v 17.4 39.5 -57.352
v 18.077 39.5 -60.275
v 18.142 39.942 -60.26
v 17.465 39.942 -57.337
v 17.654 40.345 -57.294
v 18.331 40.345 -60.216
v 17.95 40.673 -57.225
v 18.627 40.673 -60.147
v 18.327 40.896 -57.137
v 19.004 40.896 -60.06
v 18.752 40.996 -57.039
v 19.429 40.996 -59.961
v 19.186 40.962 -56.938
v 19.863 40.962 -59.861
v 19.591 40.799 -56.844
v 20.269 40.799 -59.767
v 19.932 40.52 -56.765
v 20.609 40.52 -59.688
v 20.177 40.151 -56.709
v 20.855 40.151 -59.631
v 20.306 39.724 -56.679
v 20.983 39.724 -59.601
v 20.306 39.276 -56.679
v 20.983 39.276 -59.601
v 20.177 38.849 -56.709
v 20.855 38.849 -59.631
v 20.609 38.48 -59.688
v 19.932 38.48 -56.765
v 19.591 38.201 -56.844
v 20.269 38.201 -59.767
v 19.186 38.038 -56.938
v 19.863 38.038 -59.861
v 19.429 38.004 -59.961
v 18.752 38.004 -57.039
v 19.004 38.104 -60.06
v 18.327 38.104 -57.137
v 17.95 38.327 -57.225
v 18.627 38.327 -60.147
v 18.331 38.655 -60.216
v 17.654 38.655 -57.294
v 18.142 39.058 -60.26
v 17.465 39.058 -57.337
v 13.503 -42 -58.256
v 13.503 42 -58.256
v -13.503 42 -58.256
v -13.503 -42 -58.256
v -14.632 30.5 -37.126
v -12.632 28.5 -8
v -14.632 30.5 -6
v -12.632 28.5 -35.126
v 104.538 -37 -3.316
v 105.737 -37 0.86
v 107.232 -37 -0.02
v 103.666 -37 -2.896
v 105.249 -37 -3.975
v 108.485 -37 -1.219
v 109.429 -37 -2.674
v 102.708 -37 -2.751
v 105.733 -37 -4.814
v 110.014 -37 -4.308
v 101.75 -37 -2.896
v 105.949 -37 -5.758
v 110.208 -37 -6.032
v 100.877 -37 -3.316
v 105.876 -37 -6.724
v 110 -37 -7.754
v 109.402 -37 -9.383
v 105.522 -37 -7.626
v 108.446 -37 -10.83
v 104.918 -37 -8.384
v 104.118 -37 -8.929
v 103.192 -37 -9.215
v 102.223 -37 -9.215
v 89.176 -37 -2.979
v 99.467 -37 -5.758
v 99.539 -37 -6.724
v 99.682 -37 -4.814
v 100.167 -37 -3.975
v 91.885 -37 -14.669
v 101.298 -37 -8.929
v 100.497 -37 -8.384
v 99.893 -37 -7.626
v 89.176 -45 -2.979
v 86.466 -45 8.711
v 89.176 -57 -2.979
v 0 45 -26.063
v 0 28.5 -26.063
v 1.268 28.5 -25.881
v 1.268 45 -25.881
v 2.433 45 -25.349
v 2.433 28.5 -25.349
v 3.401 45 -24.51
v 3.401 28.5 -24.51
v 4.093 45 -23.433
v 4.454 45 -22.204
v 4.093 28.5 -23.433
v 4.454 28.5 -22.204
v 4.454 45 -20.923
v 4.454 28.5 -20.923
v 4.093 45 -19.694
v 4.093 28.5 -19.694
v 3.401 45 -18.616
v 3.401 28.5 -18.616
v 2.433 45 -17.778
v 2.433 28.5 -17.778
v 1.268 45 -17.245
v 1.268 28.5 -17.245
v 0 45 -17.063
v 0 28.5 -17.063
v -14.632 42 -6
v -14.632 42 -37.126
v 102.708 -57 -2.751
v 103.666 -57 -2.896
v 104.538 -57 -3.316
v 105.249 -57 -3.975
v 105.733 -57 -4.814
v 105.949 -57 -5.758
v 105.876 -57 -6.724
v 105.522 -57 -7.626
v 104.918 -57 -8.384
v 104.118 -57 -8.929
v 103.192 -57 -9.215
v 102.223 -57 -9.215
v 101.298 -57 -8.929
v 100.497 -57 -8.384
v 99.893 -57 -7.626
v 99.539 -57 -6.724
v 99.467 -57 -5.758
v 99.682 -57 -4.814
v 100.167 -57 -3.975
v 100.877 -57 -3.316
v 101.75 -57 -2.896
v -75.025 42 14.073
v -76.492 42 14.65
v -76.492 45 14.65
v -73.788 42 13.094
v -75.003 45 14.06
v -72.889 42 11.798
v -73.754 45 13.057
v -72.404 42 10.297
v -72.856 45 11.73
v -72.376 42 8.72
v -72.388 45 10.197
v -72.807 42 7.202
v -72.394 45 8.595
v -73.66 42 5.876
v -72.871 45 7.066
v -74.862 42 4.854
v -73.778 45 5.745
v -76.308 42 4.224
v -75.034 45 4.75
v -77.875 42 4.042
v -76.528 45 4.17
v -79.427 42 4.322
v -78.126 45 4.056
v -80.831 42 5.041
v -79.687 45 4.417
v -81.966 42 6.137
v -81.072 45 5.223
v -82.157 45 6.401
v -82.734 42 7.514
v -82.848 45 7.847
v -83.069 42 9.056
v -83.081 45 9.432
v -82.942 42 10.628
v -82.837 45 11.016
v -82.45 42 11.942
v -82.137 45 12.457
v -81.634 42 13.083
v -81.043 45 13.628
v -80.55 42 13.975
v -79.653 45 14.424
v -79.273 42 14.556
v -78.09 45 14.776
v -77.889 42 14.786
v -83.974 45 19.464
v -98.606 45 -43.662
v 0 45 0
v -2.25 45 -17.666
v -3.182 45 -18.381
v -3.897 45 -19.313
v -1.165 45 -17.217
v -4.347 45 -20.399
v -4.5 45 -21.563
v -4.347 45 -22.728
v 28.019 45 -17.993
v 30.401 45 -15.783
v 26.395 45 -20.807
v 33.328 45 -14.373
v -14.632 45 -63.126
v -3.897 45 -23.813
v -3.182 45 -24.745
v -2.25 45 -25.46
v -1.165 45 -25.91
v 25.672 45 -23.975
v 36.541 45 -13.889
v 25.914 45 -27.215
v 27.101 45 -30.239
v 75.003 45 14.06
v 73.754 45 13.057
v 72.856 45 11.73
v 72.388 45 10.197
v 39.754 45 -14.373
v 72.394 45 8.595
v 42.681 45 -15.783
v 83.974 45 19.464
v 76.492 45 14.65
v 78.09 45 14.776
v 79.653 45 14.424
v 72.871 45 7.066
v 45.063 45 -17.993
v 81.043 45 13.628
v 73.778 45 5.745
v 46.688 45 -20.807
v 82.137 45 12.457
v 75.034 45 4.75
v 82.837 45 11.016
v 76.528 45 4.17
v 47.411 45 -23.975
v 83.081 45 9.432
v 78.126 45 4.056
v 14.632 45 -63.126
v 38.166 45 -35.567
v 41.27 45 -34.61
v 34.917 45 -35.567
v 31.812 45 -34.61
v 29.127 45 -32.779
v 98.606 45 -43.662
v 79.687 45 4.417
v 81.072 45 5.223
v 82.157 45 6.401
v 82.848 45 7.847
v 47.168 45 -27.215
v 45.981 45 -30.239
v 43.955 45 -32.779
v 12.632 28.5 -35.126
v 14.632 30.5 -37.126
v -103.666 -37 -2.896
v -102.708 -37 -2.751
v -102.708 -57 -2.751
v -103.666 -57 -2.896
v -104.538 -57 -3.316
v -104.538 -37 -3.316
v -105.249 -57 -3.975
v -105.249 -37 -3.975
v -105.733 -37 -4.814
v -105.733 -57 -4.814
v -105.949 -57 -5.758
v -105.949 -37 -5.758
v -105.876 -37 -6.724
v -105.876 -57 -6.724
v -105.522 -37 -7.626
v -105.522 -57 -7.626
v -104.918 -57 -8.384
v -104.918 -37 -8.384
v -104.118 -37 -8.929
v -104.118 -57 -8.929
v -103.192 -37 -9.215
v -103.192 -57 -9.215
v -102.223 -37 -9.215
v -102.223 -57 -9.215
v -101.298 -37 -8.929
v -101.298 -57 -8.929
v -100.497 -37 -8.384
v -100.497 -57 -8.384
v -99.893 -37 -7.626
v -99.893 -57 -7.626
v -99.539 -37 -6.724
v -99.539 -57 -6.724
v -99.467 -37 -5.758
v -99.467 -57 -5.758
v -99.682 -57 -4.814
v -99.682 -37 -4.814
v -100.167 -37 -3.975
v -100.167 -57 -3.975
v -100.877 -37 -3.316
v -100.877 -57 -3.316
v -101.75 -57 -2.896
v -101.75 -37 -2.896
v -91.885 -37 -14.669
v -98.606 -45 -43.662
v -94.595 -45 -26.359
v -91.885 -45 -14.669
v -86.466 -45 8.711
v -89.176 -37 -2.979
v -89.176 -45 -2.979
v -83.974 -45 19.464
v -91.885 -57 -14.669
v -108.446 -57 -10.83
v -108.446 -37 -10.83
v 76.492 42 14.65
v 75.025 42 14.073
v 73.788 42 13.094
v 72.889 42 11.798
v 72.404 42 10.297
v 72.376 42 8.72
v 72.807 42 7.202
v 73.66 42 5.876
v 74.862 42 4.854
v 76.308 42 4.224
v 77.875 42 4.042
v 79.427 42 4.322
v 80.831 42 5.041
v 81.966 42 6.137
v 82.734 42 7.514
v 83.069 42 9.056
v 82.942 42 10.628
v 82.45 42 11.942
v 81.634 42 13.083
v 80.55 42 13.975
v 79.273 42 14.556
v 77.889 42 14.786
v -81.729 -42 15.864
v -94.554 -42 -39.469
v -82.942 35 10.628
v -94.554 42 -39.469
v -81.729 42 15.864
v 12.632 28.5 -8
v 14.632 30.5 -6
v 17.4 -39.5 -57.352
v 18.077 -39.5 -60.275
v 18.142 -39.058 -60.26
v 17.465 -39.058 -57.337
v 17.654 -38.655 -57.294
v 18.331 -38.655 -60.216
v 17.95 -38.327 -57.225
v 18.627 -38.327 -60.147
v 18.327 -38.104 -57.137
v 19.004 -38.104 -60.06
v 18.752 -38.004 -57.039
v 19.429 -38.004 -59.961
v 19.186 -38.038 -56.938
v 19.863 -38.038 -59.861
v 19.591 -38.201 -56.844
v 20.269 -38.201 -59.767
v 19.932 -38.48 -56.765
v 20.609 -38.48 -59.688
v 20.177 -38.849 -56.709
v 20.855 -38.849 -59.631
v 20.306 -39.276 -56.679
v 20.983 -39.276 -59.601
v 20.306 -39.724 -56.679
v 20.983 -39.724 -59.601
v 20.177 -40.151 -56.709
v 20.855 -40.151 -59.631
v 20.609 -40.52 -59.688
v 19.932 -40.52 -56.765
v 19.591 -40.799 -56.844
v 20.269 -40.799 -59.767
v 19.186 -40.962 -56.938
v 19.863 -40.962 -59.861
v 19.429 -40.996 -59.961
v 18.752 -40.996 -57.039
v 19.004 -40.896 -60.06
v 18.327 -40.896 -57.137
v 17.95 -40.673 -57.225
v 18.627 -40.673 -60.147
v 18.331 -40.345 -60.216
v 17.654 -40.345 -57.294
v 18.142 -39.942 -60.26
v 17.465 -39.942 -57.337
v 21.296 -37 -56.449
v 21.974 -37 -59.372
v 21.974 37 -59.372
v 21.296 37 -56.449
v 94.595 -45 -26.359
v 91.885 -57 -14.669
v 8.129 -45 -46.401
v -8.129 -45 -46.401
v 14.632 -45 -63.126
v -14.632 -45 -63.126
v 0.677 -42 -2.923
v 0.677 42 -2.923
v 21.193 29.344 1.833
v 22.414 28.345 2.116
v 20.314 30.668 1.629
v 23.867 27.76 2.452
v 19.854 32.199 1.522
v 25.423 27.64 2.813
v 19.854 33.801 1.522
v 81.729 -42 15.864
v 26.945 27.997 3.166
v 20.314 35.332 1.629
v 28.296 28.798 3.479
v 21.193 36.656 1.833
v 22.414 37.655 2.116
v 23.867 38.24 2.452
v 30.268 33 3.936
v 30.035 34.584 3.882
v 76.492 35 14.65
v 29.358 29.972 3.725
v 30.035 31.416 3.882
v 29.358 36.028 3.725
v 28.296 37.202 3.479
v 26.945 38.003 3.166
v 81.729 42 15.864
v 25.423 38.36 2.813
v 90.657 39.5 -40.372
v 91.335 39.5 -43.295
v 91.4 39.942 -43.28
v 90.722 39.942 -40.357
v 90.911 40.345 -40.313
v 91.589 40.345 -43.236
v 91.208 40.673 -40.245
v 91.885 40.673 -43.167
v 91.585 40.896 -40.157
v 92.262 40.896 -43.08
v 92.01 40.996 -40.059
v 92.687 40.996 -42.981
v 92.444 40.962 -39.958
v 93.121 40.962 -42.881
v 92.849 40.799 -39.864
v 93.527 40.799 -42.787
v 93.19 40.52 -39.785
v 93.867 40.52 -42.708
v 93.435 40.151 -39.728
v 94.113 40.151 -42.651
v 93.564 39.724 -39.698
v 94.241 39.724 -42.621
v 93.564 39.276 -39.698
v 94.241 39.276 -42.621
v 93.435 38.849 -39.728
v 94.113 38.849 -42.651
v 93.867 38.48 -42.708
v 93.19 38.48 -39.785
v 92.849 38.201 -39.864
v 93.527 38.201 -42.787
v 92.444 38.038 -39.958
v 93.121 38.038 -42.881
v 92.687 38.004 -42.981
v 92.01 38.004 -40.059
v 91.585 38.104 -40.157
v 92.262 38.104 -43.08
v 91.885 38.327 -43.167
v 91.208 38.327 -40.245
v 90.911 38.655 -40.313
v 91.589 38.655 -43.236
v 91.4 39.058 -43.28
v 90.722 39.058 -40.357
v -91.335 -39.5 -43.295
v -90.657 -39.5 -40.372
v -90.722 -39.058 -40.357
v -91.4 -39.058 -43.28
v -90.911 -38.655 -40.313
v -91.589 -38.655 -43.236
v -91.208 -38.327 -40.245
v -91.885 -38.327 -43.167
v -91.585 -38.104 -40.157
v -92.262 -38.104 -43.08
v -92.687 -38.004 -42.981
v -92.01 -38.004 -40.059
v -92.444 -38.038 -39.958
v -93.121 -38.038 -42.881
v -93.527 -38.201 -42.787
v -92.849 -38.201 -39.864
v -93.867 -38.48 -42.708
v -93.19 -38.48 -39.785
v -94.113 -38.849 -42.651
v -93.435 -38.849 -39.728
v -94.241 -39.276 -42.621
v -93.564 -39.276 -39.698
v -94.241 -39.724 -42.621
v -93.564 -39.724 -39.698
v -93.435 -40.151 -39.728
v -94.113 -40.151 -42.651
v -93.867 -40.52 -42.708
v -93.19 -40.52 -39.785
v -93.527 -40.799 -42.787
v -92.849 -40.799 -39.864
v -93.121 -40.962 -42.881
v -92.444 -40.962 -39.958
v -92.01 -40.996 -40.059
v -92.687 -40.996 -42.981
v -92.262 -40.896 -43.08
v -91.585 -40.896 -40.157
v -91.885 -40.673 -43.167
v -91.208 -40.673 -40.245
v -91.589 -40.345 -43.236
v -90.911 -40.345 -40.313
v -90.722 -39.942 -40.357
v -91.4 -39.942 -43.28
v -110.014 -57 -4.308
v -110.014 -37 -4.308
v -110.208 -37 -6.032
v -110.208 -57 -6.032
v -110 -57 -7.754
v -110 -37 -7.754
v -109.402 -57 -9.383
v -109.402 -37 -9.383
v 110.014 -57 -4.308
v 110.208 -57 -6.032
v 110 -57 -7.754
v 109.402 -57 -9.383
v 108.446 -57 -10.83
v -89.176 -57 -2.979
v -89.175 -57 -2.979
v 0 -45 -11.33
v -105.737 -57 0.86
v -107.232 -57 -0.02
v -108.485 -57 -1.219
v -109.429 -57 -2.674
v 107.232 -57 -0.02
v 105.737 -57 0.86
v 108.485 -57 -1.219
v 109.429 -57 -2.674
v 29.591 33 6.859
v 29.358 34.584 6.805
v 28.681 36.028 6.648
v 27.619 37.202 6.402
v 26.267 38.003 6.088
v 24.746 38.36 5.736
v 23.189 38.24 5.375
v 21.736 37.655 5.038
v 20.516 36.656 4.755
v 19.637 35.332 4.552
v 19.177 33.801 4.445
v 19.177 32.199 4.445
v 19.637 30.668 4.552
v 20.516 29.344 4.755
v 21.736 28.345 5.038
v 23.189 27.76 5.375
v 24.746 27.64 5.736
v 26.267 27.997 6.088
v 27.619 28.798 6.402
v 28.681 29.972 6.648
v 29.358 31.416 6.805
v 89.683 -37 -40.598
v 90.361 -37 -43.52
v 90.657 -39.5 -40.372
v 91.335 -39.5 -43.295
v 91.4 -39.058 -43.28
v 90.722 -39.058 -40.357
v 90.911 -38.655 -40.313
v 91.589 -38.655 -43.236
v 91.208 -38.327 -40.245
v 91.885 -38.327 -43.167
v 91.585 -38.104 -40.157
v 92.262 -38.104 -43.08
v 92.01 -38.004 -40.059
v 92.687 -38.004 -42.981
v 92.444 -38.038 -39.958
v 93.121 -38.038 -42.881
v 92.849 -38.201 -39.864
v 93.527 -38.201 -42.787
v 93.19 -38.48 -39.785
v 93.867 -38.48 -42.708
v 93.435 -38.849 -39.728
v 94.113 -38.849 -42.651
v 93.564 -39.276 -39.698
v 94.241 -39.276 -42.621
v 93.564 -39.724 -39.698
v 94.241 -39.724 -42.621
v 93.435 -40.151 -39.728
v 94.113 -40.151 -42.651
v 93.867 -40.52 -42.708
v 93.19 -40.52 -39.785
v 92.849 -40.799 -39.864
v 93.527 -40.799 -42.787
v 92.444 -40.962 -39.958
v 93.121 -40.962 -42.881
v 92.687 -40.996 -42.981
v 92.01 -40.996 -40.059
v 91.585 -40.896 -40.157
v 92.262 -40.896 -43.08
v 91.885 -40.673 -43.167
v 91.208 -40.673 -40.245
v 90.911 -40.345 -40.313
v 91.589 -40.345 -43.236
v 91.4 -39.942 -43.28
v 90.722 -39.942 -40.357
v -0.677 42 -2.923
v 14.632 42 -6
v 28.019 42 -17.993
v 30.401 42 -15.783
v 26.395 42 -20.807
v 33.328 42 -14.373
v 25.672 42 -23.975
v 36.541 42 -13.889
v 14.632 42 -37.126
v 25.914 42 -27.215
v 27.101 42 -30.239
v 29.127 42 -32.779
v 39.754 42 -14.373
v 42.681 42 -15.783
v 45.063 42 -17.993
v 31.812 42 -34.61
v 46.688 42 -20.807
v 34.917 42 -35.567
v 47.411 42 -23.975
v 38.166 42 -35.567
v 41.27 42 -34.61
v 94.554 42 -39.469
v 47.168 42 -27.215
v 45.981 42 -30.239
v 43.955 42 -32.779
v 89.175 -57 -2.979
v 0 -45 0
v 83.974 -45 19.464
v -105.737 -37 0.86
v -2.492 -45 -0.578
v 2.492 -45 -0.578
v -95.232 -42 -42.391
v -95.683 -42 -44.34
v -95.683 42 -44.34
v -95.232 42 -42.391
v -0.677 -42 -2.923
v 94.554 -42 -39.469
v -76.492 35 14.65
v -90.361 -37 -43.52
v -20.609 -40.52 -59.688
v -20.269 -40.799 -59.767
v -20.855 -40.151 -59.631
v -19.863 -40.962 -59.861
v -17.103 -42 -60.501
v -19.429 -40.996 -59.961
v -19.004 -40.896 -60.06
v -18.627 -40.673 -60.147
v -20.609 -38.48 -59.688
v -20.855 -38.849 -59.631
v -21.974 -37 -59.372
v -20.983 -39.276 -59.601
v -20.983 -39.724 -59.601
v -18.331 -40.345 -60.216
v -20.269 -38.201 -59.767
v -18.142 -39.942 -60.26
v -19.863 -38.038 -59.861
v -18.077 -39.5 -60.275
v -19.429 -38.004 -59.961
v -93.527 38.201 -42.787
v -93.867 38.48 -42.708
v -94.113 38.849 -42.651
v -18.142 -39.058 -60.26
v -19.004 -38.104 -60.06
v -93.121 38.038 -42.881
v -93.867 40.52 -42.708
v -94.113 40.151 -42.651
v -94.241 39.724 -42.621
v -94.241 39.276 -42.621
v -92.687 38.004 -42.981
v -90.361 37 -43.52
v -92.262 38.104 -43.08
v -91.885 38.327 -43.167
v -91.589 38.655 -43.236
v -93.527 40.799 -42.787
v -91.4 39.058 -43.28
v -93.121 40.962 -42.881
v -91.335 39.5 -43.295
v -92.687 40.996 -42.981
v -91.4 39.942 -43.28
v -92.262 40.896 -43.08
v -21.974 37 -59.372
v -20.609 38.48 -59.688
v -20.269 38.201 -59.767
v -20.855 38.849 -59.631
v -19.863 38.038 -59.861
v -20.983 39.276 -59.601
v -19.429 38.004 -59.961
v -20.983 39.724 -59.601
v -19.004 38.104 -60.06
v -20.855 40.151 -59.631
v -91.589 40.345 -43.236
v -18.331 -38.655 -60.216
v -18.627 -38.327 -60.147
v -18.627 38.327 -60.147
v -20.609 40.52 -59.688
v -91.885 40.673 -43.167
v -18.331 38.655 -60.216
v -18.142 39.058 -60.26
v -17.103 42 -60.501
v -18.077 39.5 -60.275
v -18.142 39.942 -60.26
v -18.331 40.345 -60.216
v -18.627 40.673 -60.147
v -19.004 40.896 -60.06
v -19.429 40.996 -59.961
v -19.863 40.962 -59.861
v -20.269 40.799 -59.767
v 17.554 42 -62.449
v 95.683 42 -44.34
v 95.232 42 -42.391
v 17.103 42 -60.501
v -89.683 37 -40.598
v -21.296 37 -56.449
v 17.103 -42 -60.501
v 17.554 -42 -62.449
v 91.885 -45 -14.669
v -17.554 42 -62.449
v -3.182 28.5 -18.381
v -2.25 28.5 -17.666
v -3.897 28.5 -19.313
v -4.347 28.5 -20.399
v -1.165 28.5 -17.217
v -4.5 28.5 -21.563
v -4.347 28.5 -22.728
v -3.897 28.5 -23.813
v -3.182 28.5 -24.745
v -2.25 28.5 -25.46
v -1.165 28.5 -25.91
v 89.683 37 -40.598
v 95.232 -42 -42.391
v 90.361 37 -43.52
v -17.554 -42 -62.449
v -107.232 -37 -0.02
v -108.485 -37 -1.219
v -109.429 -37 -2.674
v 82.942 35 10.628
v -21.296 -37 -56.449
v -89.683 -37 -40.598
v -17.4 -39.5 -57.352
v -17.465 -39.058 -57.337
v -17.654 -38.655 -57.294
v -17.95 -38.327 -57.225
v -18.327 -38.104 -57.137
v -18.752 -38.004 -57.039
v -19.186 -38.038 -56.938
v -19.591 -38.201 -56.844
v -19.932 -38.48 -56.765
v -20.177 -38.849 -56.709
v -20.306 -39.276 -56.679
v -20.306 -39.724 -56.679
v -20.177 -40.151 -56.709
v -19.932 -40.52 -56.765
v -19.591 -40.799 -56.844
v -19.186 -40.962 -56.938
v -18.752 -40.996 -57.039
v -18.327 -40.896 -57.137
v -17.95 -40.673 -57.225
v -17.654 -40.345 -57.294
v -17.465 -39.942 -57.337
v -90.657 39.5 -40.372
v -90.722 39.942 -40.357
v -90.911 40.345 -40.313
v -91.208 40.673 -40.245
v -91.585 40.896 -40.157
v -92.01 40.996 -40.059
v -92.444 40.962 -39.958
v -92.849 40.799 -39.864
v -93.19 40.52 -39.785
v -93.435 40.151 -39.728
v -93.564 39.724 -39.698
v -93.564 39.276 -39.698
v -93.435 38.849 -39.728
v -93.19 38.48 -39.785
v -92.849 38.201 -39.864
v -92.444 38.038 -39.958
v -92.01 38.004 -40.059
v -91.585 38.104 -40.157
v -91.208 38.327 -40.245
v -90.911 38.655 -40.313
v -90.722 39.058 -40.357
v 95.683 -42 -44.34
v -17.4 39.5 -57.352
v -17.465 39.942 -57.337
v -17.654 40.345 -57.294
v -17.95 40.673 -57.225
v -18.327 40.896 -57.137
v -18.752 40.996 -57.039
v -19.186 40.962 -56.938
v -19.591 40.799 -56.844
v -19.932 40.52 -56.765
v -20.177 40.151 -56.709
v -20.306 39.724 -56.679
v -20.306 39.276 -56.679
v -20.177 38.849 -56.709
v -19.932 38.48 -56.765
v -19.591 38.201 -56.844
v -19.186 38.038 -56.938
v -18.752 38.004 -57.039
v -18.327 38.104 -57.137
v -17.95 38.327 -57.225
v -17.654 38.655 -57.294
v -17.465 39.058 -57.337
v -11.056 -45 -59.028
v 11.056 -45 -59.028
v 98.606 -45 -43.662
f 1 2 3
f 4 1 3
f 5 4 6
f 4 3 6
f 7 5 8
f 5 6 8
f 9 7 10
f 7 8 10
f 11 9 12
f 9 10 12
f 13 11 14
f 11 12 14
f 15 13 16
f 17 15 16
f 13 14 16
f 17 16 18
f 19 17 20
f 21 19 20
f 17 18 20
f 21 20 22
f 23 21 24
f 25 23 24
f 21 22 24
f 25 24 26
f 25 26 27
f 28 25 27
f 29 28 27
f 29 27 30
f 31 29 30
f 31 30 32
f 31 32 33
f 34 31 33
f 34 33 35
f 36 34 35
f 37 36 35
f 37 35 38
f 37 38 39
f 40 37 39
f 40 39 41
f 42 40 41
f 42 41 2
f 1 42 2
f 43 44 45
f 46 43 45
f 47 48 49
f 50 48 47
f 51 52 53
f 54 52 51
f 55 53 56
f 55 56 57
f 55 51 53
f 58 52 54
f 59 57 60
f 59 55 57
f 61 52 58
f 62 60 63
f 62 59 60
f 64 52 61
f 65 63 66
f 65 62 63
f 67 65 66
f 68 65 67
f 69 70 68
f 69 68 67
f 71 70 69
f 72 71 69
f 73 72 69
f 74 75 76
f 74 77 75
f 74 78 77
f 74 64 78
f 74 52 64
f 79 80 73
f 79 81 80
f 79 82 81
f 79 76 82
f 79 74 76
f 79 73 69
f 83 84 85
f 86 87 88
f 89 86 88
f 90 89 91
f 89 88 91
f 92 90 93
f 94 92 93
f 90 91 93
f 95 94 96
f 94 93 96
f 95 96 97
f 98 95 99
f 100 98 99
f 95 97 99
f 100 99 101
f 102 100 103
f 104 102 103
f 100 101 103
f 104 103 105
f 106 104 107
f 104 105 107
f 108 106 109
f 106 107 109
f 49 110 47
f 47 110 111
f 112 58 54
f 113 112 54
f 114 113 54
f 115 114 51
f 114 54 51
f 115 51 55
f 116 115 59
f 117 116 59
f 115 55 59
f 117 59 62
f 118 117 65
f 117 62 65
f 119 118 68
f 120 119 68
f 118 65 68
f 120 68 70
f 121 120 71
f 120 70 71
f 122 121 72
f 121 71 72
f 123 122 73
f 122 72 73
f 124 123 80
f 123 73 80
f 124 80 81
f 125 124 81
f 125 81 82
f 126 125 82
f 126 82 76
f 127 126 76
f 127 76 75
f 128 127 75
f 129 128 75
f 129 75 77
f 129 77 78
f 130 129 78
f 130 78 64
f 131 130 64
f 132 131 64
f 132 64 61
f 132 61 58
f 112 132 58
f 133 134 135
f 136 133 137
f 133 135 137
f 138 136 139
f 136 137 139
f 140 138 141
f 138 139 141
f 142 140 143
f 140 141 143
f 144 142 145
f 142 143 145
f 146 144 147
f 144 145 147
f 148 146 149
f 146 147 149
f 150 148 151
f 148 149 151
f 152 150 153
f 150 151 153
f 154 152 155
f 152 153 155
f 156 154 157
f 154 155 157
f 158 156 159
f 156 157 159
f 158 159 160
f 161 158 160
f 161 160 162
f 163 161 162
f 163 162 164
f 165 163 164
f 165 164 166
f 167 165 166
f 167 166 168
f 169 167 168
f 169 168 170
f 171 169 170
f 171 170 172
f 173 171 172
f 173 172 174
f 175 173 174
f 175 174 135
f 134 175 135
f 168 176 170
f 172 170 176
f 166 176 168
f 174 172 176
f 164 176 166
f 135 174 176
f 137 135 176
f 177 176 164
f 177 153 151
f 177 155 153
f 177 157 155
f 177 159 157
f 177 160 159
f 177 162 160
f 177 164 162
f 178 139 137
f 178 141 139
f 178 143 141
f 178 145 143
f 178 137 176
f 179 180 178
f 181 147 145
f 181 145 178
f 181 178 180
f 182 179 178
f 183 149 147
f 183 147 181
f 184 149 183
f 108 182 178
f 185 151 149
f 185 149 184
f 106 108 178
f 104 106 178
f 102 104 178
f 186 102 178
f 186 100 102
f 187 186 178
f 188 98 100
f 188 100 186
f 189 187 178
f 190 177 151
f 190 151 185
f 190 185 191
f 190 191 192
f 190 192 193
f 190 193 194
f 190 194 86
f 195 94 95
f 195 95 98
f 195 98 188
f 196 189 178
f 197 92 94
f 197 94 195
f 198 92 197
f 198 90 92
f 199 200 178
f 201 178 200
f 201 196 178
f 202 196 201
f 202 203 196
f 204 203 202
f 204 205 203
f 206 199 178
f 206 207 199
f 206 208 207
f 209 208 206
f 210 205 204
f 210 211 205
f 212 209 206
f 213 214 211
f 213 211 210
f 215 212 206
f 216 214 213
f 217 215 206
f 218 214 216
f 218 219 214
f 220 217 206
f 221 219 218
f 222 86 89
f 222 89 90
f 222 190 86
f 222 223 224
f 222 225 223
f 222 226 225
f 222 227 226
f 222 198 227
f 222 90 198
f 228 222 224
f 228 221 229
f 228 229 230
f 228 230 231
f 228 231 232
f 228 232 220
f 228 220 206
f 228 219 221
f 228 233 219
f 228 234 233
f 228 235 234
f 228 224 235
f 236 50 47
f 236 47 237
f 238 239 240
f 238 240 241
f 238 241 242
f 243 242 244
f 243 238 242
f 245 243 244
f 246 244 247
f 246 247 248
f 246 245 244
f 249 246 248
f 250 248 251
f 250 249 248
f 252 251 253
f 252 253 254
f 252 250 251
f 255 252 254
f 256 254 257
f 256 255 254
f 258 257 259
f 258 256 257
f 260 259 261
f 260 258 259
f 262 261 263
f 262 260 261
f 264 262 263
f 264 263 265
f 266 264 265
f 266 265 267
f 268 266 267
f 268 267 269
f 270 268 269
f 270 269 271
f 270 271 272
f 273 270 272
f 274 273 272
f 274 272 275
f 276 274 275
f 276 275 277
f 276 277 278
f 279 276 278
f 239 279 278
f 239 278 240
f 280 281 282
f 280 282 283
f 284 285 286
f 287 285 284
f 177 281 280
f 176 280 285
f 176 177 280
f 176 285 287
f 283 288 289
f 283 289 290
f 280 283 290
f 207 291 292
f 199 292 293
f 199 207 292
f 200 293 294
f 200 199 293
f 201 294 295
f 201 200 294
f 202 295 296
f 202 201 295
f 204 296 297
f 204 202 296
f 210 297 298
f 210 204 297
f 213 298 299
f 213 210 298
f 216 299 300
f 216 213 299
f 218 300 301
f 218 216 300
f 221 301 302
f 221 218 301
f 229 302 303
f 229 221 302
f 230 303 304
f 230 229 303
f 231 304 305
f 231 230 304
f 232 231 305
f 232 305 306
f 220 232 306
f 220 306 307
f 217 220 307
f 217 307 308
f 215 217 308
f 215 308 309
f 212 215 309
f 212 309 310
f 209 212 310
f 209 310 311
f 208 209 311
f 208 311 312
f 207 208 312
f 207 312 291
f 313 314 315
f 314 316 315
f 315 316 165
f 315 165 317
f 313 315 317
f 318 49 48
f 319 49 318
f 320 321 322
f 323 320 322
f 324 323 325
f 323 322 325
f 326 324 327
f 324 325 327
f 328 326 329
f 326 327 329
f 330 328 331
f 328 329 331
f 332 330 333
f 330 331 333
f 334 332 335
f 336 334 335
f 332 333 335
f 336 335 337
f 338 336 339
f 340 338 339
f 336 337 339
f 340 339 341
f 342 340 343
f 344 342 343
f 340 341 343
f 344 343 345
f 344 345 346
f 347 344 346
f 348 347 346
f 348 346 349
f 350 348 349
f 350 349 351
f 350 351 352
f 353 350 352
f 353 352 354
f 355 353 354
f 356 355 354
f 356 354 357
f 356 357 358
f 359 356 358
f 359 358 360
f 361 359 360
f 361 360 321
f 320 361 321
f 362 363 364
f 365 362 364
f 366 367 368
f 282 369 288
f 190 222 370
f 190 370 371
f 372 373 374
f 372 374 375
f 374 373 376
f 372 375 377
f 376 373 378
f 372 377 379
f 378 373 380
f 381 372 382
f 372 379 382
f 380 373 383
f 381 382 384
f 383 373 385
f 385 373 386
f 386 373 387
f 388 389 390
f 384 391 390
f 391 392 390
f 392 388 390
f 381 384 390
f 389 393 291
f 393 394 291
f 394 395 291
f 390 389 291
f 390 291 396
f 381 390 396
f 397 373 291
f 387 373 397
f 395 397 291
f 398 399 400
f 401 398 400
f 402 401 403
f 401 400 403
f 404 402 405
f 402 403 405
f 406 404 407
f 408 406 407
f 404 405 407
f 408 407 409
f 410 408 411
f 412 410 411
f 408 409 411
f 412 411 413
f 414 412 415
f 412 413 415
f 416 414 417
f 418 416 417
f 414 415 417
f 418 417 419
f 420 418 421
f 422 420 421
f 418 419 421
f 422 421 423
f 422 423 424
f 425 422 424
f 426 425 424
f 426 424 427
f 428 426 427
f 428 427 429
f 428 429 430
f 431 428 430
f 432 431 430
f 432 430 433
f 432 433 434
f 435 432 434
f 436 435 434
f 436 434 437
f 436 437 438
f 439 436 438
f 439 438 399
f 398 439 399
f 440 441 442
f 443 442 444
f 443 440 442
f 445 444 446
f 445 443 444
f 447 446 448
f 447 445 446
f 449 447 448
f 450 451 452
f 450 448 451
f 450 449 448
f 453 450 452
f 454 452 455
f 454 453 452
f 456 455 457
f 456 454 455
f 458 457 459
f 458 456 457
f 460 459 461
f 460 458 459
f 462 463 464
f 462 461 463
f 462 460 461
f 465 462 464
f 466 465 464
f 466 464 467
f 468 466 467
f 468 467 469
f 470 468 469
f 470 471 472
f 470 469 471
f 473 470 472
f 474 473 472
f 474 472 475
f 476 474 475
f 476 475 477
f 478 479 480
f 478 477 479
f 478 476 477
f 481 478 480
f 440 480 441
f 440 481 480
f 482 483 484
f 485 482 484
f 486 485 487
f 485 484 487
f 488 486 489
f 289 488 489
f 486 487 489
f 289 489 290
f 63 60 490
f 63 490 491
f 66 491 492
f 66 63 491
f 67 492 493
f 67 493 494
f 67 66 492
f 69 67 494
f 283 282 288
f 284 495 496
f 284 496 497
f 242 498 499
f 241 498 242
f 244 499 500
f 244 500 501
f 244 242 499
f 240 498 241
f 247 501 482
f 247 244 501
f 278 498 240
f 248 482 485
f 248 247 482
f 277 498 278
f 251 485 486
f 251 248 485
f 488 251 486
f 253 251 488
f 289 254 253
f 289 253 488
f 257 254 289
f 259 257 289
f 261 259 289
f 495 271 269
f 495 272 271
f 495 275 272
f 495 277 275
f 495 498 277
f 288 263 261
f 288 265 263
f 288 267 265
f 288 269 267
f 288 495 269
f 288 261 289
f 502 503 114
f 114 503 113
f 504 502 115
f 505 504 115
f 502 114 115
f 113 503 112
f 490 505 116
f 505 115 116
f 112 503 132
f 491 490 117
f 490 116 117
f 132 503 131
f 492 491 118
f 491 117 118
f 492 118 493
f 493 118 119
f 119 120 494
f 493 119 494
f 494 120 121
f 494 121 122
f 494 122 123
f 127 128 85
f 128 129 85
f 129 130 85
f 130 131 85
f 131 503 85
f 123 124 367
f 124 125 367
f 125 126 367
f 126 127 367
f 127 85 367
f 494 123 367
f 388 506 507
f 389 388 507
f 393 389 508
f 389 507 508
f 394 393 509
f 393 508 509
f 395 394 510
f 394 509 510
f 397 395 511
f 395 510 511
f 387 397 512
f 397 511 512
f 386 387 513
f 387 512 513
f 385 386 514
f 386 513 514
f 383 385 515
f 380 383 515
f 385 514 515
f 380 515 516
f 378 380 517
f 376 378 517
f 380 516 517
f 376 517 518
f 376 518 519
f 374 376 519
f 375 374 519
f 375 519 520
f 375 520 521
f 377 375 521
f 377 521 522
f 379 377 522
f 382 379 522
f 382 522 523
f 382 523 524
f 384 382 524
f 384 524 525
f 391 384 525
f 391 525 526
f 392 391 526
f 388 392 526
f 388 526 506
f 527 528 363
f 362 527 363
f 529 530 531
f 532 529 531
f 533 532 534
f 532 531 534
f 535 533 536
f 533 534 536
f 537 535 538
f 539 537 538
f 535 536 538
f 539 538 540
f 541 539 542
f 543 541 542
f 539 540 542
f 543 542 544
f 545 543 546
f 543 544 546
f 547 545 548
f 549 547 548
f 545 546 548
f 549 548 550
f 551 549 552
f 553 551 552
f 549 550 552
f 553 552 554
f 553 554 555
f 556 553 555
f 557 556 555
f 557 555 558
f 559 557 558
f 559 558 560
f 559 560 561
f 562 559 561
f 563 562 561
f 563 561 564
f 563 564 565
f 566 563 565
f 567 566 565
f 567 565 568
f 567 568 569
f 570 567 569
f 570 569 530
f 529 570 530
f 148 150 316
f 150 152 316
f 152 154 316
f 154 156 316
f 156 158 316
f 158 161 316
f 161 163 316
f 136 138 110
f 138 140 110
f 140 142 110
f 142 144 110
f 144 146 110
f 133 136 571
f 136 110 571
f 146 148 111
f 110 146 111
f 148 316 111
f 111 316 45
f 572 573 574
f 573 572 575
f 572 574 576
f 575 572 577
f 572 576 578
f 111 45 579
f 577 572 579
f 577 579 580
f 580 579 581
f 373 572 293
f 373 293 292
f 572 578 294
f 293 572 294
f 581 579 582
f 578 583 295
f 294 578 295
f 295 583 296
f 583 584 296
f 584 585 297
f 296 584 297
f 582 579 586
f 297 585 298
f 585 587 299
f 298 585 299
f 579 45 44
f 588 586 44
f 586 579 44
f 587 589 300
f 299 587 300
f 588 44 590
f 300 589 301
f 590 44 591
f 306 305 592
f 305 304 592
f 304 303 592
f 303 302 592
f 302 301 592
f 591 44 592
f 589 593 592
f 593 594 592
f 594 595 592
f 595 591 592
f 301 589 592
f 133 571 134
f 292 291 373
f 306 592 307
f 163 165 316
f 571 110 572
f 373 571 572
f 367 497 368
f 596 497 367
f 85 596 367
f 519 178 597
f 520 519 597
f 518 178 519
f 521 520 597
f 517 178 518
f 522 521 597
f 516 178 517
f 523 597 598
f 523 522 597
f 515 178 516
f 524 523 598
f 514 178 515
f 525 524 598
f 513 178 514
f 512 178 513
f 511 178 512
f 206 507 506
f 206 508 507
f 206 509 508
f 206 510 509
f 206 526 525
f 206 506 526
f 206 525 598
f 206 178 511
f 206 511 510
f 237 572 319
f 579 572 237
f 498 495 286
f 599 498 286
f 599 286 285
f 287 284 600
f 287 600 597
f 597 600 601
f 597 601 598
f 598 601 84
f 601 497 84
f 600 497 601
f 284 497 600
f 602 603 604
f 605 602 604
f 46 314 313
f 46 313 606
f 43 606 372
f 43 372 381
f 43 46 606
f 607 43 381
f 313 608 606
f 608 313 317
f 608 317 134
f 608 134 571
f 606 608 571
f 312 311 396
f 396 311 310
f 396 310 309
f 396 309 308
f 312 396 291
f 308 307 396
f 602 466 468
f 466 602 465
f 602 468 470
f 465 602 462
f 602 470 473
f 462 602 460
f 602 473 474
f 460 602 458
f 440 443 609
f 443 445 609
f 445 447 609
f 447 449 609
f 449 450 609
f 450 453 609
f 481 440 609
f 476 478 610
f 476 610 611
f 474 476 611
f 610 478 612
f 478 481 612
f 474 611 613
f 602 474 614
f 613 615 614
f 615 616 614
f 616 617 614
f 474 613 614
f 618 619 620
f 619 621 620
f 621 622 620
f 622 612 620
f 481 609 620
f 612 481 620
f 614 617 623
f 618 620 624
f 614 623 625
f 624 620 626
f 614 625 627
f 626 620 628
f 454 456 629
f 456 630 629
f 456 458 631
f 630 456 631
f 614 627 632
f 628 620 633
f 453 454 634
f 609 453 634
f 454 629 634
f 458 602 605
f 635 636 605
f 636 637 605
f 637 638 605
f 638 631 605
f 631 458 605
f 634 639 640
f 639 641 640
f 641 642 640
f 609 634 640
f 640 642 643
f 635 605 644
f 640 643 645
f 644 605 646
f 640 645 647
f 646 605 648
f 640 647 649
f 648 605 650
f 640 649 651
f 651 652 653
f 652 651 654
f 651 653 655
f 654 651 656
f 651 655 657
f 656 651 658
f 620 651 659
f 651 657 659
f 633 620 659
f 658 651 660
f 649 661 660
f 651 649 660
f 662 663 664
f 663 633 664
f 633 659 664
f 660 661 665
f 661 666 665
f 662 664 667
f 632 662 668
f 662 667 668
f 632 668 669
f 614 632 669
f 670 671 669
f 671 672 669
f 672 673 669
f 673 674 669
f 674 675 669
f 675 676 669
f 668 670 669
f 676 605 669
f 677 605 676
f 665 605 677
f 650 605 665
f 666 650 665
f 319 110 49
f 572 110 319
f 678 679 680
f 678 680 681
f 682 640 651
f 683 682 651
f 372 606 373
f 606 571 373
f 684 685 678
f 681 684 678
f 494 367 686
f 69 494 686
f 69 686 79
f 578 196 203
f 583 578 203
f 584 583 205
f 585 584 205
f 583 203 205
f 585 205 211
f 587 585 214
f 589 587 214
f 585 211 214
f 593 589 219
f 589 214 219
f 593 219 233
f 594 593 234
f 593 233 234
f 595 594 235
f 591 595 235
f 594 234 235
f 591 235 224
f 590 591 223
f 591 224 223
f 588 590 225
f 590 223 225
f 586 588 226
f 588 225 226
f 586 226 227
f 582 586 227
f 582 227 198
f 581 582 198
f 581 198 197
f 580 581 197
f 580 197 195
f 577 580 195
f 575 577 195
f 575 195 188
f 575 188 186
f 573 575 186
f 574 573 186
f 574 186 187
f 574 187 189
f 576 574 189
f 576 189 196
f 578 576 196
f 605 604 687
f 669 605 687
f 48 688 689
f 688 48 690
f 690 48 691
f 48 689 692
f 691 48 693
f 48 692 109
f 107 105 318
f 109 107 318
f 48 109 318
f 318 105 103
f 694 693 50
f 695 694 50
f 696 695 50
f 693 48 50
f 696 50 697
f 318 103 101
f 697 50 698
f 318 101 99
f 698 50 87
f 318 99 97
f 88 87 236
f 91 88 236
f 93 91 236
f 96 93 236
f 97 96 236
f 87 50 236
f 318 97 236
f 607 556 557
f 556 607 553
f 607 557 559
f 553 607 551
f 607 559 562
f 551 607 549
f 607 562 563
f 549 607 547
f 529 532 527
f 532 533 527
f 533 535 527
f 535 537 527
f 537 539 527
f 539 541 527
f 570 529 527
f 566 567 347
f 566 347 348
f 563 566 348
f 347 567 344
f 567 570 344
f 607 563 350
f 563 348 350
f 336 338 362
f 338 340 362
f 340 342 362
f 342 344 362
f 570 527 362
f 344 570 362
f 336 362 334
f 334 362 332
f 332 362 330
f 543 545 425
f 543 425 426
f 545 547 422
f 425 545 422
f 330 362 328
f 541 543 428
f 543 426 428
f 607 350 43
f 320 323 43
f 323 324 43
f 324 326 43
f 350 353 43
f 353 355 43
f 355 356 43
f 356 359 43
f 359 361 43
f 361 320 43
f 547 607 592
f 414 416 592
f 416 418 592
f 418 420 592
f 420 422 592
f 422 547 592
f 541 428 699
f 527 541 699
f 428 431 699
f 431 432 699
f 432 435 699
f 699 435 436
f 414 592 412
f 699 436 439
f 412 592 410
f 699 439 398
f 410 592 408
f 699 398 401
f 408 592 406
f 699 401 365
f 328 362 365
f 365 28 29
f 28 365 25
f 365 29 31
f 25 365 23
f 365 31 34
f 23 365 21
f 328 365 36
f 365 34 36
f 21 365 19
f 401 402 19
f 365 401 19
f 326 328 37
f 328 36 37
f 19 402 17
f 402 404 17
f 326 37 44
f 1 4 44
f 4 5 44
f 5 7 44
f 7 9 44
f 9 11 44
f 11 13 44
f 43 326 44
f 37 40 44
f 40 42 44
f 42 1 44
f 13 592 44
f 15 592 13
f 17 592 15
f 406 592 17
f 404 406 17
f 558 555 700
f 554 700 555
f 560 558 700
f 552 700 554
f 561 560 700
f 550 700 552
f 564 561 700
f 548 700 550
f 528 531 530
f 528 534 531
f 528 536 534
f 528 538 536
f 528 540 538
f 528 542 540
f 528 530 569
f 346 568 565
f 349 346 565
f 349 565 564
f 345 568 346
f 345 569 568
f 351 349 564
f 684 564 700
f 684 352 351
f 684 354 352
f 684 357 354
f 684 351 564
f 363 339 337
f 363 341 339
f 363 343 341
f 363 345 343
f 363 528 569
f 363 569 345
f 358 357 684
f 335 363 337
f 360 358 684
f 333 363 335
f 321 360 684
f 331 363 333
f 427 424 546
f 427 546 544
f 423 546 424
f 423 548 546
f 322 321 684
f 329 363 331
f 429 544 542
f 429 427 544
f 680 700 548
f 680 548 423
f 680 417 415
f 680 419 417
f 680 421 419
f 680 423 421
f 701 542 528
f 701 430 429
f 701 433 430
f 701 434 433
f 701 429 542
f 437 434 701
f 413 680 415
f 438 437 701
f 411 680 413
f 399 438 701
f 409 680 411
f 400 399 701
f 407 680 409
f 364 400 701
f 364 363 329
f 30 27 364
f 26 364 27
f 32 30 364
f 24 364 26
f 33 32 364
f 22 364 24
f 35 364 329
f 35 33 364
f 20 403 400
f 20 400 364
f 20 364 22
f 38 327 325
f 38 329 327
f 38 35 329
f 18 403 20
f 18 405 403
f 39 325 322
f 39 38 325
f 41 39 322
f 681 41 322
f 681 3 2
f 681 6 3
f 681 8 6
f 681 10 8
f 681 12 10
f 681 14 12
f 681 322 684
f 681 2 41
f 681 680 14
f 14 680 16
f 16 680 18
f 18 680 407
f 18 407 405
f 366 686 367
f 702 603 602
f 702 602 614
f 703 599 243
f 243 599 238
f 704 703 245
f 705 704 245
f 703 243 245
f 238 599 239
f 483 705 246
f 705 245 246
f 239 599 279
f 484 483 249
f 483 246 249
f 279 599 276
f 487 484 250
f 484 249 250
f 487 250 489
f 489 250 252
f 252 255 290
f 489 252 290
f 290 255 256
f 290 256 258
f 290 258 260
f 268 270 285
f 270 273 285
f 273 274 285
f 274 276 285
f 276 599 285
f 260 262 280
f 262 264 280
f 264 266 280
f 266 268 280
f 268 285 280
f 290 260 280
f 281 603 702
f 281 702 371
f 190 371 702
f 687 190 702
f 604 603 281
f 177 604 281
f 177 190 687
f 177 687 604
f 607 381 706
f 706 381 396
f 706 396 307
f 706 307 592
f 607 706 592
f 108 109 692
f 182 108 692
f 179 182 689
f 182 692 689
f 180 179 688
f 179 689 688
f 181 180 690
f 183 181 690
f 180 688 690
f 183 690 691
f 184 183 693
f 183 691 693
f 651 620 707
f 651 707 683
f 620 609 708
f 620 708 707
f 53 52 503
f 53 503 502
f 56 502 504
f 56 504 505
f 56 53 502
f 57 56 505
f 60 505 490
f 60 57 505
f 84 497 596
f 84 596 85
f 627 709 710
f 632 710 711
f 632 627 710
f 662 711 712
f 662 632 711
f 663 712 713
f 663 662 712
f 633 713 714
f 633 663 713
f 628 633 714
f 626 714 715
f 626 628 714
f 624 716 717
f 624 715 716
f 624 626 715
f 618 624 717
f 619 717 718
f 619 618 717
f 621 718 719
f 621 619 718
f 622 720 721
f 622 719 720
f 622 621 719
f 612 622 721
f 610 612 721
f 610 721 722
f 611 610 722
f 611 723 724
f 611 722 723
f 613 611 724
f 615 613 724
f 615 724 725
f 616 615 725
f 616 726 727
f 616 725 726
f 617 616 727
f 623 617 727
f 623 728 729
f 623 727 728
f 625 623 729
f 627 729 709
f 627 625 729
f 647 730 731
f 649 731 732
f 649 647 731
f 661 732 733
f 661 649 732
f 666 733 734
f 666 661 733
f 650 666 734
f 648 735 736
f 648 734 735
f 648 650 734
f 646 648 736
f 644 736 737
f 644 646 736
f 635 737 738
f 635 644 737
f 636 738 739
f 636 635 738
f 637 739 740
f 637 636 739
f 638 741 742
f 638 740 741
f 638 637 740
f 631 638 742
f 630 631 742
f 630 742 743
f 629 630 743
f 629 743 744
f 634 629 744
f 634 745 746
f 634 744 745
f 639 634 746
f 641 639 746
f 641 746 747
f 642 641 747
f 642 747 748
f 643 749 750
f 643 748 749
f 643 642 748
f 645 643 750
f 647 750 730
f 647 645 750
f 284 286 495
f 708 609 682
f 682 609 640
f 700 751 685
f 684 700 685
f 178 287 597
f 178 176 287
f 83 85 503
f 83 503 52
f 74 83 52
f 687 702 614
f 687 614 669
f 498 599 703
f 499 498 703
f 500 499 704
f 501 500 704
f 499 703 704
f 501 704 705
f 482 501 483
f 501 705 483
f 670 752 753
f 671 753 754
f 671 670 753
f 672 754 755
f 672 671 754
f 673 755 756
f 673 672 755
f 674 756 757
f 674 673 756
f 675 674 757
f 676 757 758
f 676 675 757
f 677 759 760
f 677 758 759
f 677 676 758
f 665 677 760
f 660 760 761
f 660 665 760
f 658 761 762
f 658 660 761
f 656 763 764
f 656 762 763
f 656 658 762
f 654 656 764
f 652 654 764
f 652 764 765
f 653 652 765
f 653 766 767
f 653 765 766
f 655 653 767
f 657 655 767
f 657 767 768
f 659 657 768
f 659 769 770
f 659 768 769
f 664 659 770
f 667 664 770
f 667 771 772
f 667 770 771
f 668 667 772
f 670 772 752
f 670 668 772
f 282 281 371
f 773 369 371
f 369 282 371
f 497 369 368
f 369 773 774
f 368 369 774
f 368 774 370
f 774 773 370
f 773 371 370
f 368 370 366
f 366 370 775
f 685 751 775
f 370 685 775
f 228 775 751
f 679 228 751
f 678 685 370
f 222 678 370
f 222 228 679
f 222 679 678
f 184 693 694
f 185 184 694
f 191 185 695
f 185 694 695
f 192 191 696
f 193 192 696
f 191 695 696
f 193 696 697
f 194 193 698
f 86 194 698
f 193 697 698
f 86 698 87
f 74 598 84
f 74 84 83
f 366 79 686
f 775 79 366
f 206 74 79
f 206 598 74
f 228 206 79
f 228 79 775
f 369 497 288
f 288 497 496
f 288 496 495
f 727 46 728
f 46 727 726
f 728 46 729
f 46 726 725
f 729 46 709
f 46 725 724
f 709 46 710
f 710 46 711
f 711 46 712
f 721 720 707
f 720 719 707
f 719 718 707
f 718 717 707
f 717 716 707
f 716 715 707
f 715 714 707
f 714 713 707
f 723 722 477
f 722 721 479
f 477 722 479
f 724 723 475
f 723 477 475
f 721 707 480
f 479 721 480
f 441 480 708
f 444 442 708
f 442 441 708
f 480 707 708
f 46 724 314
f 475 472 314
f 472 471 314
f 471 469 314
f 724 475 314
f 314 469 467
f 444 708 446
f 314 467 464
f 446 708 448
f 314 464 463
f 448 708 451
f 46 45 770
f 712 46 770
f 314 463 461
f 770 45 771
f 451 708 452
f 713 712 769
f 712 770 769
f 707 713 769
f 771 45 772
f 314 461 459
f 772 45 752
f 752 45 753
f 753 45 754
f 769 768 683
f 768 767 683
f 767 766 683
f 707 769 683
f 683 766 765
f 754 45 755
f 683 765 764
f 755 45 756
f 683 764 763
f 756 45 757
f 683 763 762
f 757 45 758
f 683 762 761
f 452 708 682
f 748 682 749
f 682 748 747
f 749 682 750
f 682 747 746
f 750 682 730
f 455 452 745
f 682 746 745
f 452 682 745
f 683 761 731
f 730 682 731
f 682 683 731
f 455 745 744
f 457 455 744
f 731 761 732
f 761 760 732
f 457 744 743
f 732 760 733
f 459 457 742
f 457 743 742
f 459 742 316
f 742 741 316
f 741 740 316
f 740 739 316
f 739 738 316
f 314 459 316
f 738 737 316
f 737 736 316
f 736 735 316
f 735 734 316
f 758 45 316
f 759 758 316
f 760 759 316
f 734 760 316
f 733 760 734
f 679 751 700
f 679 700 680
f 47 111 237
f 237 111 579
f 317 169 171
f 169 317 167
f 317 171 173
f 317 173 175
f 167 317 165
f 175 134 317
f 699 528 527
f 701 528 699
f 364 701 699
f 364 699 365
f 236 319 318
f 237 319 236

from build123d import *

# Parameters (mm, degrees)
EXTERNAL_DIMENSIONS_DEPTH             = 45
INTERNAL_CAVITY_DEPTH                 = 42
SKETCH5_W                             = 80.200000486
SKETCH5_H                             = 84.000000972
FIRST_CUTOUT_DEPTH                    = 2
SKETCH6_R                             = 1.5
SKETCH6_W                             = 70.200000486
SKETCH6_H                             = 74.000000972
SECOND_CUTOUT_HOLES_FOR_INSERTS_DEPTH = 3.1
SKETCH8_W                             = 29.263844186
SKETCH8_H                             = 31.126435476
TOPATTACHMENTSUPPORT_DEPTH            = 15
TOPATTACHMENT_SIZE                    = 2
TOP_HOLE_DEPTH                        = 20
BOTTOMSUPPORT_DEPTH                   = 12
CHAMFER1_SIZE                         = 12
LEFTCUT_DEPTH                         = 60
EXTRACUT_DEPTH                        = 100
SKETCH18_W                            = 12
SKETCH18_H                            = 20
BOTTOMATTACHMENT_DEPTH                = 20
BOTTOM_ATTACHMENT_ROUNDING_REACH      = 154.026
SKETCH19_R                            = 3.25
SKETCH20_R                            = 5.375
WIREEXIT_DEPTH                        = 10
SKETCH23_R                            = 5.375
CHARGERPORT_DEPTH                     = 10
SKETCH29_R                            = 10.9
CUT_EXTRUDE1_DEPTH                    = 10


with BuildPart() as part:
    # Sketch1 → External Dimensions (new, symmetric)
    with BuildSketch(Plane(origin=(0, 0, 0), x_dir=(1, 0, 0), z_dir=(0, 1, 0))):
        Polygon((0, 0), (83.973745957, -19.464069204), (98.60566805, 43.662366272), (14.631922093, 63.126435476), (-14.631922093, 63.126435476), (-98.60566805, 43.662366272), (-83.973745957, -19.464069204), align=None)
    extrude(amount=EXTERNAL_DIMENSIONS_DEPTH, both=True)

    # Sketch4 → Internal Cavity (cut, symmetric)
    with BuildSketch(Plane(origin=(0, 0, 0), x_dir=(1, 0, 0), z_dir=(0, 1, 0))):
        Polygon((-0.677403801, 2.922520161), (0.677403801, 2.922520161), (81.728629596, -15.864145243), (94.554142028, 39.468903028), (13.502915759, 58.255568541), (-13.502915759, 58.255568541), (-94.554142028, 39.468903028), (-81.728629596, -15.864145243), align=None)
    extrude(amount=INTERNAL_CAVITY_DEPTH, both=True, mode=Mode.SUBTRACT)

    # Sketch5 → First Cutout (cut)
    with BuildSketch(Plane(origin=(14.631922093, 0, -63.126435476), x_dir=(-0.9741733869698493, 0, -0.22580126686910412), z_dir=(0.22580126686910412, 0, -0.9741733869698493))):
        with Locations((-43.100000243, 0)):
            Rectangle(SKETCH5_W, SKETCH5_H)
    first_cutout = extrude(amount=-FIRST_CUTOUT_DEPTH, mode=Mode.SUBTRACT)

    # Sketch6 → Second Cutout + Holes for Inserts (cut)
    with BuildSketch(Plane(origin=(14.180319559, 0, -61.178088702), x_dir=(-0.9741733869698493, 0, -0.2258012668691041), z_dir=(0.2258012668691041, 0, -0.9741733869698493))):
        with Locations((-80.700000486, 39.500000486)):
            Circle(SKETCH6_R)
        with Locations((-5.499999514, 39.500000486)):
            Circle(SKETCH6_R)
        with Locations((-5.499999514, -39.500000486)):
            Circle(SKETCH6_R)
        with Locations((-80.700000486, -39.500000486)):
            Circle(SKETCH6_R)
        with Locations((-43.100000243, 0)):
            Rectangle(SKETCH6_W, SKETCH6_H)
    second_cutout_holes_for_inserts = extrude(amount=-SECOND_CUTOUT_HOLES_FOR_INSERTS_DEPTH, mode=Mode.SUBTRACT)

    # Mirror1: First Cutout, Second Cutout + Holes for Inserts across plane
    add(first_cutout.mirror(Plane(origin=(0, 0, 0), x_dir=(0, 0, 1), z_dir=(1, 0, 0))), mode=Mode.SUBTRACT)
    add(second_cutout_holes_for_inserts.mirror(Plane(origin=(0, 0, 0), x_dir=(0, 0, 1), z_dir=(1, 0, 0))), mode=Mode.SUBTRACT)

    # Sketch8 → TopAttachmentSupport (add)
    with BuildSketch(Plane(origin=(0, 43.5, 0), x_dir=(1, 0, 0), z_dir=(0, 1, 0))):
        with Locations((0, 21.563217738)):
            Rectangle(SKETCH8_W, SKETCH8_H)
    extrude(amount=-TOPATTACHMENTSUPPORT_DEPTH)

    # TopAttachment
    topattachment_edges = [part.edges().sort_by_distance(p)[0] for p in [
        (0, 28.5, -6),
        (0, 28.5, -37.126435476),
        (14.631922093, 28.5, -21.563217738),
        (-14.631922093, 28.5, -21.563217738),
    ]]
    chamfer(topattachment_edges, length=TOPATTACHMENT_SIZE)

    # Sketch9 → Top Hole (cut)
    with BuildSketch(Plane(origin=(0, 28.5, 0), x_dir=(-1, 0, 0), z_dir=(0, -1, 0))):
        with BuildLine():
            ThreePointArc((4.5, 21.563217738), (3.181980515, 24.745198253), (0, 26.063217738))
            Line((0, 26.063217738), (0, 17.063217738))
            ThreePointArc((0, 17.063217738), (3.181980515, 18.381237222), (4.5, 21.563217738))
        make_face()
        with BuildLine():
            Line((0, 17.063217738), (0, 26.063217738))
            ThreePointArc((0, 26.063217738), (-4.5, 21.563217738), (0, 17.063217738))
        make_face()
    extrude(amount=-TOP_HOLE_DEPTH, mode=Mode.SUBTRACT)

    # Sketch10 → BottomSupport (add)
    with BuildSketch(Plane.XZ.offset(45)):
        Polygon((-89.175695767, -2.978679395), (0, -23.648495823), (89.175695767, -2.978679395), (91.88531097, -14.668760038), (0, -35.966631548), (-91.88531097, -14.668760038), align=None)
    extrude(amount=BOTTOMSUPPORT_DEPTH)

    # Chamfer1
    chamfer1_edges = [part.edges().sort_by_distance(p)[0] for p in [
        (45.942655485, -45, -25.317695793),
        (44.587847884, -45, -13.313587609),
        (-44.587847884, -45, -13.313587609),
        (-45.942655485, -45, -25.317695793),
    ]]
    chamfer(chamfer1_edges, length=CHAMFER1_SIZE - 0.0001)  # a hair under: the kernel refuses the full size

    # Sketch14 → LeftCut (cut)
    with BuildSketch(Plane(origin=(0, 0, 0), x_dir=(0.9741733869698491, 0, -0.22580126686910457), z_dir=(0.22580126686910457, 0, 0.9741733869698491))):
        Polygon((2.558409664, -45), (-86.2, -57), (5.339860316, -57), align=None)
    leftcut = extrude(amount=-LEFTCUT_DEPTH, mode=Mode.SUBTRACT)

    # Mirror2: LeftCut across plane
    add(leftcut.mirror(Plane(origin=(0, 0, 0), x_dir=(0, 0, 1), z_dir=(1, 0, 0))), mode=Mode.SUBTRACT)

    # Sketch17 → ExtraCut (cut)
    with BuildSketch(Plane.XZ.offset(45)):
        Polygon((0, -11.330360098), (8.128845607, -46.400602029), (0, -48.284767272), (-8.128845607, -46.400602029), align=None)
    extrude(amount=EXTRACUT_DEPTH, mode=Mode.SUBTRACT)

    # Sketch18 → BottomAttachment (add)
    with BuildSketch(Plane(origin=(83.973745957, 0, 19.464069204), x_dir=(0.22580126686910407, 0, -0.9741733869698493), z_dir=(0.9741733869698493, 0, 0.22580126686910407))):
        with Locations((29.037735273, -47)):
            Rectangle(SKETCH18_W, SKETCH18_H)
    bottomattachment = extrude(amount=BOTTOMATTACHMENT_DEPTH)

    # Sketch19 → Bottom Attachment Rounding (cut, up to next)
    with BuildSketch(Plane(origin=(0, -37, 0), x_dir=(1, 0, 0), z_dir=(0, 1, 0)), mode=Mode.PRIVATE) as bottom_attachment_rounding_sk1:
        with Locations(Location((102.707670706, 6.001203881, 0), (0, 0, 270))):
            Circle(SKETCH19_R)
    bottom_attachment_rounding_tool1 = extrude(bottom_attachment_rounding_sk1.sketch, amount=-BOTTOM_ATTACHMENT_ROUNDING_REACH, mode=Mode.PRIVATE) & part.part
    # Sketch19 → Bottom Attachment Rounding (cut, up to next)
    with BuildSketch(Plane(origin=(0, -37, 0), x_dir=(1, 0, 0), z_dir=(0, 1, 0)), mode=Mode.PRIVATE) as bottom_attachment_rounding_sk2:
        with BuildLine():
            ThreePointArc((110.013971108, 4.307694379), (109.999984924, 7.753959807), (108.446258548, 10.830138501))
            Line((108.446258548, 10.830138501), (111.368778709, 10.152734701))
            Line((111.368778709, 10.152734701), (110.013971108, 4.307694379))
        make_face()
    bottom_attachment_rounding_tool2 = extrude(bottom_attachment_rounding_sk2.sketch, amount=-BOTTOM_ATTACHMENT_ROUNDING_REACH, mode=Mode.PRIVATE) & part.part
    # Sketch19 → Bottom Attachment Rounding (cut, up to next)
    with BuildSketch(Plane(origin=(0, -37, 0), x_dir=(1, 0, 0), z_dir=(0, 1, 0)), mode=Mode.PRIVATE) as bottom_attachment_rounding_sk3:
        with BuildLine():
            Line((110.013971108, 4.307694379), (108.659163507, -1.537345943))
            Line((108.659163507, -1.537345943), (105.736643346, -0.859942142))
            ThreePointArc((105.736643346, -0.859942142), (108.485263978, 1.219006062), (110.013971108, 4.307694379))
        make_face()
    bottom_attachment_rounding_tool3 = extrude(bottom_attachment_rounding_sk3.sketch, amount=-BOTTOM_ATTACHMENT_ROUNDING_REACH, mode=Mode.PRIVATE) & part.part
    bottom_attachment_rounding_1 = bottom_attachment_rounding_tool1.solids().sort_by_distance((102.707671, -37, -6.001204))[0]
    add(bottom_attachment_rounding_1, mode=Mode.SUBTRACT)
    bottom_attachment_rounding_2 = bottom_attachment_rounding_tool2.solids().sort_by_distance((110.209545, -37, -8.949999))[0]
    add(bottom_attachment_rounding_2, mode=Mode.SUBTRACT)
    bottom_attachment_rounding_3 = bottom_attachment_rounding_tool3.solids().sort_by_distance((108.14727, -37, -0.052736))[0]
    add(bottom_attachment_rounding_3, mode=Mode.SUBTRACT)
    bottom_attachment_rounding = bottom_attachment_rounding_1 + bottom_attachment_rounding_2 + bottom_attachment_rounding_3  # Bottom Attachment Rounding as one shape, for the pattern or mirror that repeats it

    # Mirror3: BottomAttachment, Bottom Attachment Rounding across plane
    add(bottomattachment.mirror(Plane(origin=(0, 0, 0), x_dir=(0, 0, 1), z_dir=(1, 0, 0))))
    add(bottom_attachment_rounding.mirror(Plane(origin=(0, 0, 0), x_dir=(0, 0, 1), z_dir=(1, 0, 0))), mode=Mode.SUBTRACT)

    # Sketch20 → WireExit (cut)
    with BuildSketch(Plane(origin=(40.135943543, 45, 9.303012195), x_dir=(0.22580126686910407, 0, -0.9741733869698493), z_dir=(0, -1, 0))):
        with Locations(Location((8.375, 36.625, 0), (0, 0, 180))):
            Circle(SKETCH20_R)
    wireexit = extrude(amount=WIREEXIT_DEPTH, mode=Mode.SUBTRACT)

    # Mirror4: WireExit across plane
    add(wireexit.mirror(Plane(origin=(0, 0, 0), x_dir=(0, 0, 1), z_dir=(1, 0, 0))), mode=Mode.SUBTRACT)

    # Sketch23 → ChargerPort (cut)
    with BuildSketch(Plane(origin=(0, 0, 0), x_dir=(0.9741733869698492, 0, 0.22580126686910437), z_dir=(-0.22580126686910437, 0, 0.9741733869698492))):
        with Locations((25, 33)):
            Circle(SKETCH23_R)
    extrude(amount=-CHARGERPORT_DEPTH, mode=Mode.SUBTRACT)

    # Sketch29 → Cut-Extrude1 (cut)
    with BuildSketch(Plane(origin=(0, 45, 0), x_dir=(1, 0, 0), z_dir=(0, 1, 0))):
        with Locations(Location((36.541162656, 24.789179732, 0), (0, 0, 270))):
            Circle(SKETCH29_R)
    extrude(amount=-CUT_EXTRUDE1_DEPTH, mode=Mode.SUBTRACT)


solid = part.part
